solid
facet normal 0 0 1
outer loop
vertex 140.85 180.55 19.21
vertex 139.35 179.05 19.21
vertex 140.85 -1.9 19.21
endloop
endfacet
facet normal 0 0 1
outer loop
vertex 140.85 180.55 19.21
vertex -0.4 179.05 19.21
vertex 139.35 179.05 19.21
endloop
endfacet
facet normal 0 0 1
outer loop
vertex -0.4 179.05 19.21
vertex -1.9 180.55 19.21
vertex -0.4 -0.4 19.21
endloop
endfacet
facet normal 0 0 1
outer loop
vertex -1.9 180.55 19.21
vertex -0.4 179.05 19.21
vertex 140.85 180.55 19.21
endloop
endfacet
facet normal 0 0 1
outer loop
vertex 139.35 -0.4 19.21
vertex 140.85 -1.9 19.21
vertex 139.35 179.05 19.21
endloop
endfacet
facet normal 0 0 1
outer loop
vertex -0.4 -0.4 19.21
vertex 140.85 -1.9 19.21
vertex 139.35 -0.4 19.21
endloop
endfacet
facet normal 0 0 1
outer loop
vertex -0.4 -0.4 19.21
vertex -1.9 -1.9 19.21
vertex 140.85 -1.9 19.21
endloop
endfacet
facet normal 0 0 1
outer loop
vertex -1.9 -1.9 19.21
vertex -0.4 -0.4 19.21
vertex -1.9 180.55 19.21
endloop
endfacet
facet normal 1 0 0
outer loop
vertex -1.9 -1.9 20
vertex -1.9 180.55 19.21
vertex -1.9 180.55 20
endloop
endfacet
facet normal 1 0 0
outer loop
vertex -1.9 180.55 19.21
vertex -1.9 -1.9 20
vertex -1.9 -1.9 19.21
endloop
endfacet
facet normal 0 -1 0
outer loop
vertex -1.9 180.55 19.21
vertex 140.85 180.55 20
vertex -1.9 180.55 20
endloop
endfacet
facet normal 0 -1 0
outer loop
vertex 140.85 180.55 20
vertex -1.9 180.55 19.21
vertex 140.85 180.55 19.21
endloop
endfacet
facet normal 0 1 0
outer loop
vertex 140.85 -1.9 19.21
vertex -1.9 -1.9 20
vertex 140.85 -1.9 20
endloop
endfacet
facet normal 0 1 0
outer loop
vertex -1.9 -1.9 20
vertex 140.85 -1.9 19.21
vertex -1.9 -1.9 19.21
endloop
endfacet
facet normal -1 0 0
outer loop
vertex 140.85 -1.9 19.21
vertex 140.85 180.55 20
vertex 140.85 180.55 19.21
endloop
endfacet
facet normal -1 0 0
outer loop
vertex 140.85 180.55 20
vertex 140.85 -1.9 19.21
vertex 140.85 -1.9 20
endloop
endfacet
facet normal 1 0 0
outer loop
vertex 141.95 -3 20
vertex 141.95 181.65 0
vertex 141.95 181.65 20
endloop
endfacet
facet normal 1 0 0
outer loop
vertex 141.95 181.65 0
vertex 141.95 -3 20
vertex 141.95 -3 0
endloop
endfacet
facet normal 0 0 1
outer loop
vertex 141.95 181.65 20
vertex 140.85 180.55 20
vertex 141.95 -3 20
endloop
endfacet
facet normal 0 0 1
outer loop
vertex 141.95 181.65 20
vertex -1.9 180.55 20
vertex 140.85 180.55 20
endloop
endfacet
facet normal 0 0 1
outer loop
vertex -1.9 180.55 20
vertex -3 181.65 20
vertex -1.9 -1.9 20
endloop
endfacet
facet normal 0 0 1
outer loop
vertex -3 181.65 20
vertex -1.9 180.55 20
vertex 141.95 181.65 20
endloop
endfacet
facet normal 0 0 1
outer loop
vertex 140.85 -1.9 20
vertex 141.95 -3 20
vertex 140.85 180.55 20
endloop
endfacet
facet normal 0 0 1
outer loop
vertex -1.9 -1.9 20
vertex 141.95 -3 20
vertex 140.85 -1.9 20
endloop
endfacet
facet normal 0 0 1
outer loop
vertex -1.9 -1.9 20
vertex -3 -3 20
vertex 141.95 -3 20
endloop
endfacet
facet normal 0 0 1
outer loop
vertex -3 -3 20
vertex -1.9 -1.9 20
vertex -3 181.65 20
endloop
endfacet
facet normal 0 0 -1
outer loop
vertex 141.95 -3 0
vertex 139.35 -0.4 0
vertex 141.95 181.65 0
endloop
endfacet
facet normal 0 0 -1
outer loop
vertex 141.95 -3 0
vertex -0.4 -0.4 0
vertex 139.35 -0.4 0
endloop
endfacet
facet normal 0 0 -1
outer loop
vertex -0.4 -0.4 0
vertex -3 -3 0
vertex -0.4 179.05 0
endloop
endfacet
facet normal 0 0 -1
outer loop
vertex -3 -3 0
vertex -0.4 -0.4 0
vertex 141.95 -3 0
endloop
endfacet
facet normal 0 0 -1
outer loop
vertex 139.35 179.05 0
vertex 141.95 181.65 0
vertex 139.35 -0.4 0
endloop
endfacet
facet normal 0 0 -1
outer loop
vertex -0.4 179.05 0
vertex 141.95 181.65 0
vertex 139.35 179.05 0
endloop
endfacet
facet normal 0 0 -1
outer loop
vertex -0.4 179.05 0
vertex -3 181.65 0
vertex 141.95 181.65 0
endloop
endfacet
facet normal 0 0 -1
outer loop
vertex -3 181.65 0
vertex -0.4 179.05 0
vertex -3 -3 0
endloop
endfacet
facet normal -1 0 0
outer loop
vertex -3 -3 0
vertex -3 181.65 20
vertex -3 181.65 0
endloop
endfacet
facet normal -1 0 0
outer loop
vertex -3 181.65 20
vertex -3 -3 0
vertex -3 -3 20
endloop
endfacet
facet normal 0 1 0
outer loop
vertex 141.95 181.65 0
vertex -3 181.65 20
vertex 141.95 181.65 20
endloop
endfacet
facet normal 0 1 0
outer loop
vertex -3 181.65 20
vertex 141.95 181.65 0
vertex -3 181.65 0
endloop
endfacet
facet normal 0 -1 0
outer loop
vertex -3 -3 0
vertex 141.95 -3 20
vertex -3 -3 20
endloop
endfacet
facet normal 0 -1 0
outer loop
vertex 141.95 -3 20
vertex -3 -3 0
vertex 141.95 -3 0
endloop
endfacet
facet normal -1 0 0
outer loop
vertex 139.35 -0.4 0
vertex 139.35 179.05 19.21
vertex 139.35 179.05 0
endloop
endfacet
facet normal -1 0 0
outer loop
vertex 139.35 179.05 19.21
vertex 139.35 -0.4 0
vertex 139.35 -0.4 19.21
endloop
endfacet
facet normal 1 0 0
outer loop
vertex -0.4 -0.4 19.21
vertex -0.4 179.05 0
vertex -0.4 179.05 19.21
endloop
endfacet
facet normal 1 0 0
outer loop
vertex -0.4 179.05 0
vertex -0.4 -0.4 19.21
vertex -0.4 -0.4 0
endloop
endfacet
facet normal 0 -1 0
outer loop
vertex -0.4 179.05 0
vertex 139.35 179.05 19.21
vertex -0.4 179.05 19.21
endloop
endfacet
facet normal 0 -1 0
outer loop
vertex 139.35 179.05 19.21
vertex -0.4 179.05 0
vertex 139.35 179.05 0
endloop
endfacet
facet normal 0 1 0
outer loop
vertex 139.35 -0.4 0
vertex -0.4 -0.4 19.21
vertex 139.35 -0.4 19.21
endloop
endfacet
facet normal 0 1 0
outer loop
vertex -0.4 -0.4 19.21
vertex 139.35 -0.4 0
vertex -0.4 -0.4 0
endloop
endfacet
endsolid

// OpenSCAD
/*

  puzzle_frame.scad

  Winston Freer Tile Puzzle: Frame
      
  (c) olikraus@gmail.com

  This work is licensed under the Creative Commons Attribution-NonCommercial-ShareAlike 4.0 International License. 
  To view a copy of this license, visit http://creativecommons.org/licenses/by-nc-sa/4.0/.
    
*/

include <winston_freer.scad>;


frame();
